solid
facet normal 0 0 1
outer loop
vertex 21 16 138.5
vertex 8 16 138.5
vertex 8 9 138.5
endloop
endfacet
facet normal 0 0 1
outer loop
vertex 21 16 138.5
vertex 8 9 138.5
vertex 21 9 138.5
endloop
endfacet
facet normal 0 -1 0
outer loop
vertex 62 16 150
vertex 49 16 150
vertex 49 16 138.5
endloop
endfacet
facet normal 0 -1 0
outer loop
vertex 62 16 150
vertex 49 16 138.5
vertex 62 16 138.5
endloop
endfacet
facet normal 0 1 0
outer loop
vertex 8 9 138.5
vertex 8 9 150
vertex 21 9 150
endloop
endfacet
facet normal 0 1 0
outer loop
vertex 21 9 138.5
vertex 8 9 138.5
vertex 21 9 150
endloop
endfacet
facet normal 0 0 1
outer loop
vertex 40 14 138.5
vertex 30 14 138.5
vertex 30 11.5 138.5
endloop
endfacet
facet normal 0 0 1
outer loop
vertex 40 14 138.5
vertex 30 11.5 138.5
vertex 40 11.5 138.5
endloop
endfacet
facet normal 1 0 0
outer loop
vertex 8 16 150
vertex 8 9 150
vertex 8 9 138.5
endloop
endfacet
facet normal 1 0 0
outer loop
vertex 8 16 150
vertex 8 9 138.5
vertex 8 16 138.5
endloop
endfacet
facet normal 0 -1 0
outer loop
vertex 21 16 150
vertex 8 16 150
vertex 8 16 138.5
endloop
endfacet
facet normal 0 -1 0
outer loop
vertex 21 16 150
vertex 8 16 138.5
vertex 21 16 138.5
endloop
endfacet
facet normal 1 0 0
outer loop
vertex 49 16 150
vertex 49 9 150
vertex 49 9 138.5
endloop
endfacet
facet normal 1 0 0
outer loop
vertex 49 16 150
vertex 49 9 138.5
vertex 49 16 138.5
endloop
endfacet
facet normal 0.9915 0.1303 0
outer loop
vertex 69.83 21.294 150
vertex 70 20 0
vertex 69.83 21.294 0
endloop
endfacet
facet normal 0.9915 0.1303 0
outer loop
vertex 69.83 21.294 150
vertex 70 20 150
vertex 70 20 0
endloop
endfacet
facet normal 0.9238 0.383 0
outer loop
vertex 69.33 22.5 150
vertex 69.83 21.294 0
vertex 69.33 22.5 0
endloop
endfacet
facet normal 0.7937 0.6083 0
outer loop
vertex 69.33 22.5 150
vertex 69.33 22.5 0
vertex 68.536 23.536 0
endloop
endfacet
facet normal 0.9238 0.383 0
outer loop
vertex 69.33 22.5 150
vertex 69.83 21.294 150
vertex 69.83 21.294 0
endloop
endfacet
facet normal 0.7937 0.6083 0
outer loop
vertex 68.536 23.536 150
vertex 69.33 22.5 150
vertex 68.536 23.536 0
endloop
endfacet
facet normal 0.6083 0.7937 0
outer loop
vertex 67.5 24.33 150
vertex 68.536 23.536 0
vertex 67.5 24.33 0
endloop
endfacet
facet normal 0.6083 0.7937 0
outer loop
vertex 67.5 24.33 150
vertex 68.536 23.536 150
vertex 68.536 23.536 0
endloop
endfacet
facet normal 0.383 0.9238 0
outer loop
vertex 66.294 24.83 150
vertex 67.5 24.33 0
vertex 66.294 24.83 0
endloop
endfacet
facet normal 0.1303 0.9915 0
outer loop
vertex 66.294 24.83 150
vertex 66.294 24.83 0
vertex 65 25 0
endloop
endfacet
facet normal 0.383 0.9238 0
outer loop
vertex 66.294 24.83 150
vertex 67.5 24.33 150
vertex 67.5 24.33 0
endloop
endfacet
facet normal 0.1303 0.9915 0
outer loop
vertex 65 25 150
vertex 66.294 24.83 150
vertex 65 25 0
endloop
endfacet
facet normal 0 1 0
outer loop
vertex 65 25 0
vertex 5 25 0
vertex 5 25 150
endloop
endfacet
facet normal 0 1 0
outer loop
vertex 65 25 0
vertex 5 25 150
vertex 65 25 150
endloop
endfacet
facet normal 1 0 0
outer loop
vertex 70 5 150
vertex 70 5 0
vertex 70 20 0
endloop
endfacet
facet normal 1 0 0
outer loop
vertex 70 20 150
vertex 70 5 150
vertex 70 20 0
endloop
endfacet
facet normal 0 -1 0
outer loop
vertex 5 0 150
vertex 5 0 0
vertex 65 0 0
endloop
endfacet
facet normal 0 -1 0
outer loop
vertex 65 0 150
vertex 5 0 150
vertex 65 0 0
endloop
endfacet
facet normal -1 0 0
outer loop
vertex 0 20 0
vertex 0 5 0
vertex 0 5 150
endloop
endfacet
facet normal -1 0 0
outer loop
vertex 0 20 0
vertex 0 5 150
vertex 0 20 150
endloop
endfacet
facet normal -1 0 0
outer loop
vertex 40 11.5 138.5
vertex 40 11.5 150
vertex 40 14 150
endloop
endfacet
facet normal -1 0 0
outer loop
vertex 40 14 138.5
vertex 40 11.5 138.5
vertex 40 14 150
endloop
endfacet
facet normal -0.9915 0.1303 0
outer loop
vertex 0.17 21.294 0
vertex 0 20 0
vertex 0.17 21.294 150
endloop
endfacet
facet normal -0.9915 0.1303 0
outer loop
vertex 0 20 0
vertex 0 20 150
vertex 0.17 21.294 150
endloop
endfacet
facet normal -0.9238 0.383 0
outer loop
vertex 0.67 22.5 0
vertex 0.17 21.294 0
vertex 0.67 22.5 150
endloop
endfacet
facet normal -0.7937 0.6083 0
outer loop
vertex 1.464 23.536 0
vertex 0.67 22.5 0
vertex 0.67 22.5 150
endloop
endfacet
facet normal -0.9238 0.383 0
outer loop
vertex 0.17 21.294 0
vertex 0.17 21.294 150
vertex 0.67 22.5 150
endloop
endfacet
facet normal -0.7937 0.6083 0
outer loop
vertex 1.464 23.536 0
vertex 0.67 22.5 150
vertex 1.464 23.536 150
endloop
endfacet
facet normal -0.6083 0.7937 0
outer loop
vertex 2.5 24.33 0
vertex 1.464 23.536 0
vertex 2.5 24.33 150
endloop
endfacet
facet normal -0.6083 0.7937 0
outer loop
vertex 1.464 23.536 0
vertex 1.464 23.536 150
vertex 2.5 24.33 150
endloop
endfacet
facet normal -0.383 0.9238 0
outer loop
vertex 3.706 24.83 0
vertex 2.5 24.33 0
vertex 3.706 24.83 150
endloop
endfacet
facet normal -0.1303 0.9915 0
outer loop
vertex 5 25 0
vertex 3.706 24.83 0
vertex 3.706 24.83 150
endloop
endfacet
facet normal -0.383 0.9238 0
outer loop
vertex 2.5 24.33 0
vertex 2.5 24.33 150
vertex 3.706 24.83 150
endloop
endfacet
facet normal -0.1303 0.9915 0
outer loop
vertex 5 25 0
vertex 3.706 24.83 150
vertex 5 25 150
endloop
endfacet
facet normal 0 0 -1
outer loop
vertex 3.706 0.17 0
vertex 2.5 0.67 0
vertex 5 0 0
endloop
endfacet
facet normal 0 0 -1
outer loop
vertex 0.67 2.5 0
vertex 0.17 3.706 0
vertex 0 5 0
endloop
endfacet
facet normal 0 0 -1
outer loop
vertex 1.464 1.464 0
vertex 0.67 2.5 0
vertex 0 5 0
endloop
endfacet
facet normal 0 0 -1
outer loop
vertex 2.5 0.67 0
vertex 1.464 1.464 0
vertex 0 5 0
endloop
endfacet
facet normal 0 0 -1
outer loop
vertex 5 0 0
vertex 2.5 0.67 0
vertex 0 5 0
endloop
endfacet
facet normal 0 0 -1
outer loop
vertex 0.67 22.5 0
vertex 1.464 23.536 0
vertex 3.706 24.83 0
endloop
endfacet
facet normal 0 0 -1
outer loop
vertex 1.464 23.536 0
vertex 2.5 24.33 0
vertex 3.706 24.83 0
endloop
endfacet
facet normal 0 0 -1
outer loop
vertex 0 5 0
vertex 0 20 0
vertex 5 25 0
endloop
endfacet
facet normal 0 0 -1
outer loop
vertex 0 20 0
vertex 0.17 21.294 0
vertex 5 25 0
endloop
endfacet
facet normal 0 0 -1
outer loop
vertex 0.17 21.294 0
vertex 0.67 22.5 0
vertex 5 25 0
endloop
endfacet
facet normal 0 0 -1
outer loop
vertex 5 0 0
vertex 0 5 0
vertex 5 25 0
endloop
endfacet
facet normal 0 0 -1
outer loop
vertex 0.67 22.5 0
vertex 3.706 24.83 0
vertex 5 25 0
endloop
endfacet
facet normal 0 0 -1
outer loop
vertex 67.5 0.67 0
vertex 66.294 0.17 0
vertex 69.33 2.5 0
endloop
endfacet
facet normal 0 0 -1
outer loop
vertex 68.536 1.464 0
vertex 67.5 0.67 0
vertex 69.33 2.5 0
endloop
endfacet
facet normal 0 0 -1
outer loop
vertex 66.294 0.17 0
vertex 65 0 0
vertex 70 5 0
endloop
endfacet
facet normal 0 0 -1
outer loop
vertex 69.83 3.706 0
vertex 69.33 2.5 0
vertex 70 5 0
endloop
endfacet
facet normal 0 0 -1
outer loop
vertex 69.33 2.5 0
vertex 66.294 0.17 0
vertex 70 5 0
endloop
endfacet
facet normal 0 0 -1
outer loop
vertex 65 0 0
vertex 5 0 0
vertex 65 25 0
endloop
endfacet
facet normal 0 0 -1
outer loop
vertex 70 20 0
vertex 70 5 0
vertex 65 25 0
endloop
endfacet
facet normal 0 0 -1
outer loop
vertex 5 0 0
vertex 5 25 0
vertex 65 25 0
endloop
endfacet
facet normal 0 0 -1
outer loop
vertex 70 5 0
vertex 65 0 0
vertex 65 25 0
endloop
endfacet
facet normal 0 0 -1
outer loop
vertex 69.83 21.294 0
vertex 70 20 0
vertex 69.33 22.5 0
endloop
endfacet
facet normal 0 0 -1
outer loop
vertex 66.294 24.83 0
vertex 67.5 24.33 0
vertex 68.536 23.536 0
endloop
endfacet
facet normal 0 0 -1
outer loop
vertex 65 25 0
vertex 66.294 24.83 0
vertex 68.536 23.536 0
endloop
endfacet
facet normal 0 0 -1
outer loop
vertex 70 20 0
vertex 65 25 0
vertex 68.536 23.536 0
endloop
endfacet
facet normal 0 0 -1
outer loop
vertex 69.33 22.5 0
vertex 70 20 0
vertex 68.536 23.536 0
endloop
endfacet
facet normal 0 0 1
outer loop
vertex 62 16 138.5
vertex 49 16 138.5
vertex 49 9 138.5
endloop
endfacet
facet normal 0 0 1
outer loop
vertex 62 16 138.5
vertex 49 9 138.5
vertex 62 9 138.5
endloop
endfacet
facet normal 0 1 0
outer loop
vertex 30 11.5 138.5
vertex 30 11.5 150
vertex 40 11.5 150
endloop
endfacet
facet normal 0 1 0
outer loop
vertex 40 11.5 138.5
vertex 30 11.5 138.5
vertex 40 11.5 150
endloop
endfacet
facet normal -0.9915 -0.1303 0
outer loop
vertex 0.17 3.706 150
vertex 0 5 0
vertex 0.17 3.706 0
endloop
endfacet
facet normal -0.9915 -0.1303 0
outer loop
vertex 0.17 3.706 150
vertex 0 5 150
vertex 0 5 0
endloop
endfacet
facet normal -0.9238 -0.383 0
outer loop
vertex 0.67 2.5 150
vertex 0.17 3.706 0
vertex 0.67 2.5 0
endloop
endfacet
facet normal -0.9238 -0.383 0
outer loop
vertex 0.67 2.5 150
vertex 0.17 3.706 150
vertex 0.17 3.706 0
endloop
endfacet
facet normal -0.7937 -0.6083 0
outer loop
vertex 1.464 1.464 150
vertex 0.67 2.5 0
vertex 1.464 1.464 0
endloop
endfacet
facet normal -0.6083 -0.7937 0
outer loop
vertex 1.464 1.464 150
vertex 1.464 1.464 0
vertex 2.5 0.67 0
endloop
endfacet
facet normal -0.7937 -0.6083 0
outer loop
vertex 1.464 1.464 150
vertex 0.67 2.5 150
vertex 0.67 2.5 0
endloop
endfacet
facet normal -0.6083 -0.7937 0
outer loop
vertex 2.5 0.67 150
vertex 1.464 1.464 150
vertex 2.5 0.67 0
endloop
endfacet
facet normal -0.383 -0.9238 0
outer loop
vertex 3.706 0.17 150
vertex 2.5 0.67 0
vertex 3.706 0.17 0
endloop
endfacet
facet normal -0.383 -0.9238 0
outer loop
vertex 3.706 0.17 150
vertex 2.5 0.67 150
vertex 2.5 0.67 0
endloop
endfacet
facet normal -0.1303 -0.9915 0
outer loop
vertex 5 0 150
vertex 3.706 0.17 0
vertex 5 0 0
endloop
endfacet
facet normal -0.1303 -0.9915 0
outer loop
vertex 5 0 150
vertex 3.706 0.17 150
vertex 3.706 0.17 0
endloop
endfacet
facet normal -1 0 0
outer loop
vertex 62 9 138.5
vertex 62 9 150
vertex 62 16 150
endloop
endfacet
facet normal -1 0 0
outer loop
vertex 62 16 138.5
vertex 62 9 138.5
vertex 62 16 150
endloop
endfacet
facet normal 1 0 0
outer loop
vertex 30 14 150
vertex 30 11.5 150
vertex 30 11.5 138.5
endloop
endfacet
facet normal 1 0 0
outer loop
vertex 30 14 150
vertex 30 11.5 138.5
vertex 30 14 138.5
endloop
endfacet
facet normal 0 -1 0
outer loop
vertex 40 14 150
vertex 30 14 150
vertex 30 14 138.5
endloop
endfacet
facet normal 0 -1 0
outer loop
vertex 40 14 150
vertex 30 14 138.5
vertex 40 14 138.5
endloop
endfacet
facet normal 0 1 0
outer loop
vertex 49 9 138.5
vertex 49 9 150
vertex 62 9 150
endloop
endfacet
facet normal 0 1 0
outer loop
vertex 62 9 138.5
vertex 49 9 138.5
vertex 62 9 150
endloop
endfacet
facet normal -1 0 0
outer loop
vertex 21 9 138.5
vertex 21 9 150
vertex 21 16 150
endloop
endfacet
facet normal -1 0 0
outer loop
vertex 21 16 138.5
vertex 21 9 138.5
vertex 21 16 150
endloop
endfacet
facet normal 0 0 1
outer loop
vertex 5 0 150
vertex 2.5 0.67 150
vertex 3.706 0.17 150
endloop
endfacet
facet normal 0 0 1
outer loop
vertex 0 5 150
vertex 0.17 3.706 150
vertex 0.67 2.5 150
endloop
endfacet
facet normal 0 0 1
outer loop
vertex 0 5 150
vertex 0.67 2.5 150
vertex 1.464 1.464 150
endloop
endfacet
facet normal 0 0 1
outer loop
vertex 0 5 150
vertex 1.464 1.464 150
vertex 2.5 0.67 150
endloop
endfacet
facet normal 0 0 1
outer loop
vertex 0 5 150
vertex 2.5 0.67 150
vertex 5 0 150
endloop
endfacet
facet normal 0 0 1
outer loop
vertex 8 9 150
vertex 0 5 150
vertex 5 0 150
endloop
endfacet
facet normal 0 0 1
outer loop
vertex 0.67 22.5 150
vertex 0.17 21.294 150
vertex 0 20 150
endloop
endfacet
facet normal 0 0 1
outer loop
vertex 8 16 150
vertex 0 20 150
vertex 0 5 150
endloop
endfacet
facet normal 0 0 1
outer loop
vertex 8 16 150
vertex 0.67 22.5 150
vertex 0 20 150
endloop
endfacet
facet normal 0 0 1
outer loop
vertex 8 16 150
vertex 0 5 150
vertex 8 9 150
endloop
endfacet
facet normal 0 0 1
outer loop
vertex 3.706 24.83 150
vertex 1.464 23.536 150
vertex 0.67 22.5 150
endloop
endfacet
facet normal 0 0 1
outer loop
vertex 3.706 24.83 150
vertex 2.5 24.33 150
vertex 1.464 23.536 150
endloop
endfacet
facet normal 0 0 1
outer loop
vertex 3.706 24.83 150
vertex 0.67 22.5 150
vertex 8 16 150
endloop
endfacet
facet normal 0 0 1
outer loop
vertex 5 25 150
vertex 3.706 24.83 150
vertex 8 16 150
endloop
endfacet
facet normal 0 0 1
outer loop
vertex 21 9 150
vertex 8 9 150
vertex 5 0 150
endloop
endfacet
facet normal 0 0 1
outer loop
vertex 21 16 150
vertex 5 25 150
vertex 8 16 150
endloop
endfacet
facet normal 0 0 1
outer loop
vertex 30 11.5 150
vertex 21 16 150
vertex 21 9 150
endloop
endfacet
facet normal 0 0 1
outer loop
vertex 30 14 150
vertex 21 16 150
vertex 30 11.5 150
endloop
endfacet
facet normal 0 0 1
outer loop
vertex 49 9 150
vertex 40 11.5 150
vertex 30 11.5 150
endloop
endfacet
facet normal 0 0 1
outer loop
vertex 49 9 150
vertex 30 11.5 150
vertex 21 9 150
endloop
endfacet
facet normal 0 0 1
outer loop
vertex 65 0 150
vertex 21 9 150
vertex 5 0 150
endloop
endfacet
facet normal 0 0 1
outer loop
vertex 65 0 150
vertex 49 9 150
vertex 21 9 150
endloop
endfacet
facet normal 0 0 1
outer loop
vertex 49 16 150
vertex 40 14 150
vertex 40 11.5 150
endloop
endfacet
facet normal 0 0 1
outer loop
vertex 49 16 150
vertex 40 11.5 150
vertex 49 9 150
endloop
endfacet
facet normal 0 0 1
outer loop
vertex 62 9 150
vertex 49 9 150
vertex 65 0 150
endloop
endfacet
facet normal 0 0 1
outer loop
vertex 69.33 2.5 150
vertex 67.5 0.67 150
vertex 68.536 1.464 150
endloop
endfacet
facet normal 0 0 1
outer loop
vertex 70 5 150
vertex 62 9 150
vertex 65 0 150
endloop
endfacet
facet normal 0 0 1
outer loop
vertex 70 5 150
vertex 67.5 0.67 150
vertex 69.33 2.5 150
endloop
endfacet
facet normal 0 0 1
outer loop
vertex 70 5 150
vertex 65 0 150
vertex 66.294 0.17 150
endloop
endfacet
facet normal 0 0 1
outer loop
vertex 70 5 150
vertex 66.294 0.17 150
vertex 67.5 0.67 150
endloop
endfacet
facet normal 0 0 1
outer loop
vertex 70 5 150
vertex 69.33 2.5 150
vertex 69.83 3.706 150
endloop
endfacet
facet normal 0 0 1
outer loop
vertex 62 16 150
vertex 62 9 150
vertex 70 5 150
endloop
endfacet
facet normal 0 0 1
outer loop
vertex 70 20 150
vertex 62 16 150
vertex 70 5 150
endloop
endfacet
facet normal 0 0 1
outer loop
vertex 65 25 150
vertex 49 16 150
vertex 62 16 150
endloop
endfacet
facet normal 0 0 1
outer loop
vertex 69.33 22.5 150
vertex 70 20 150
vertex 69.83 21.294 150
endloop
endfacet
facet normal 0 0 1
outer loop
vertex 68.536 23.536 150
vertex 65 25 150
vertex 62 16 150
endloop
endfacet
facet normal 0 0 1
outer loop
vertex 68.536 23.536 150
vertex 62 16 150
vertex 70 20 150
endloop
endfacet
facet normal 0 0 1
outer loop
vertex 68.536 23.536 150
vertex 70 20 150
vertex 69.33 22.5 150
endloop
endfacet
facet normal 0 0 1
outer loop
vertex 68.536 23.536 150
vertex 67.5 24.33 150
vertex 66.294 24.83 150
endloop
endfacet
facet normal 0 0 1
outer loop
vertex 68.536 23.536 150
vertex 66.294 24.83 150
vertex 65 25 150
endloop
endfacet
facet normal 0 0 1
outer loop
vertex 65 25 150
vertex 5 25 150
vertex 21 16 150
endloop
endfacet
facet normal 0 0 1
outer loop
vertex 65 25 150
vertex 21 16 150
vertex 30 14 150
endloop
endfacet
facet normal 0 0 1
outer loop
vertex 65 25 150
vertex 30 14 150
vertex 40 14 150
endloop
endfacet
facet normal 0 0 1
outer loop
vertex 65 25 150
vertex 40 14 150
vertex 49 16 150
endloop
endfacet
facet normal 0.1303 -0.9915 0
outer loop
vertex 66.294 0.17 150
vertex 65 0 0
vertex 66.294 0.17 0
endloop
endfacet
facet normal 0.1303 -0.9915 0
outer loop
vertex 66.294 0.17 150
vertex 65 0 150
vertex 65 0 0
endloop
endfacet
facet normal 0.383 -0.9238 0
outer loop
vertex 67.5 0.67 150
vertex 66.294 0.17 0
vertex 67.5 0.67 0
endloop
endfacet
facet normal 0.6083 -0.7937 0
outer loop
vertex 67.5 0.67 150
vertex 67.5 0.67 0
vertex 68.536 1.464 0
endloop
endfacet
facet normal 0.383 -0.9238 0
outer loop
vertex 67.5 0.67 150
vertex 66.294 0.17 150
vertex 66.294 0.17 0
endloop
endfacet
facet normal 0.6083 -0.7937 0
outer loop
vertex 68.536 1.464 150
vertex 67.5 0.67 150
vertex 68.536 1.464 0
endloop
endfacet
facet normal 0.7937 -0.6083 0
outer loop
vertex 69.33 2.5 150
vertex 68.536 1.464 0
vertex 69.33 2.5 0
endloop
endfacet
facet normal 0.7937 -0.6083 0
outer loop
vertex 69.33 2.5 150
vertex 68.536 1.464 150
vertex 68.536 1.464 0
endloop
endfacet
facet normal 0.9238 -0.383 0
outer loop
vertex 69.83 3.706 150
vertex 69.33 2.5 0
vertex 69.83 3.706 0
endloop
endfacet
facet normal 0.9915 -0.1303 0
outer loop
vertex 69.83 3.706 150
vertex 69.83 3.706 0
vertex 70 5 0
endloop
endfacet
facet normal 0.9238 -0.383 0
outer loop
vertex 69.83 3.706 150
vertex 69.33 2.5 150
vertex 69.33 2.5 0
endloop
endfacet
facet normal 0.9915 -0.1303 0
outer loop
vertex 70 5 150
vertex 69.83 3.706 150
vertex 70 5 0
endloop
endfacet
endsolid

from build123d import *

# Parameters (mm, degrees)
ESQUISSE1_W             = 70
ESQUISSE1_H             = 25
BOSS_EXTRU_1_DEPTH      = 150
CONG_1_R                = 5
ESQUISSE2_W             = 13
ESQUISSE2_H             = 7
ESQUISSE2_W_2           = 10
ESQUISSE2_H_2           = 2.5
ENL_V_MAT_EXTRU_1_DEPTH = 11.5


with BuildPart() as part:
    # Esquisse1 → Boss.-Extru.1 (new body)
    with BuildSketch(Plane.XY):
        with Locations((35, 12.5)):
            Rectangle(ESQUISSE1_W, ESQUISSE1_H)
    extrude(amount=BOSS_EXTRU_1_DEPTH)

    # Congé1
    cong_1_edges = [part.edges().sort_by_distance(p)[0] for p in [
        (0, 25, 75),
        (70, 25, 75),
        (70, 0, 75),
        (0, 0, 75),
    ]]
    fillet(cong_1_edges, radius=CONG_1_R)

    # Esquisse2 → Enlèv. mat.-Extru.1 (cut)
    with BuildSketch(Plane.XY.offset(150)):
        with Locations((14.5, 12.5)):
            Rectangle(ESQUISSE2_W, ESQUISSE2_H)
        with Locations((55.5, 12.5)):
            Rectangle(ESQUISSE2_W, ESQUISSE2_H)
        with Locations((35, 12.75)):
            Rectangle(ESQUISSE2_W_2, ESQUISSE2_H_2)
    extrude(amount=-ENL_V_MAT_EXTRU_1_DEPTH, mode=Mode.SUBTRACT)


solid = part.part
